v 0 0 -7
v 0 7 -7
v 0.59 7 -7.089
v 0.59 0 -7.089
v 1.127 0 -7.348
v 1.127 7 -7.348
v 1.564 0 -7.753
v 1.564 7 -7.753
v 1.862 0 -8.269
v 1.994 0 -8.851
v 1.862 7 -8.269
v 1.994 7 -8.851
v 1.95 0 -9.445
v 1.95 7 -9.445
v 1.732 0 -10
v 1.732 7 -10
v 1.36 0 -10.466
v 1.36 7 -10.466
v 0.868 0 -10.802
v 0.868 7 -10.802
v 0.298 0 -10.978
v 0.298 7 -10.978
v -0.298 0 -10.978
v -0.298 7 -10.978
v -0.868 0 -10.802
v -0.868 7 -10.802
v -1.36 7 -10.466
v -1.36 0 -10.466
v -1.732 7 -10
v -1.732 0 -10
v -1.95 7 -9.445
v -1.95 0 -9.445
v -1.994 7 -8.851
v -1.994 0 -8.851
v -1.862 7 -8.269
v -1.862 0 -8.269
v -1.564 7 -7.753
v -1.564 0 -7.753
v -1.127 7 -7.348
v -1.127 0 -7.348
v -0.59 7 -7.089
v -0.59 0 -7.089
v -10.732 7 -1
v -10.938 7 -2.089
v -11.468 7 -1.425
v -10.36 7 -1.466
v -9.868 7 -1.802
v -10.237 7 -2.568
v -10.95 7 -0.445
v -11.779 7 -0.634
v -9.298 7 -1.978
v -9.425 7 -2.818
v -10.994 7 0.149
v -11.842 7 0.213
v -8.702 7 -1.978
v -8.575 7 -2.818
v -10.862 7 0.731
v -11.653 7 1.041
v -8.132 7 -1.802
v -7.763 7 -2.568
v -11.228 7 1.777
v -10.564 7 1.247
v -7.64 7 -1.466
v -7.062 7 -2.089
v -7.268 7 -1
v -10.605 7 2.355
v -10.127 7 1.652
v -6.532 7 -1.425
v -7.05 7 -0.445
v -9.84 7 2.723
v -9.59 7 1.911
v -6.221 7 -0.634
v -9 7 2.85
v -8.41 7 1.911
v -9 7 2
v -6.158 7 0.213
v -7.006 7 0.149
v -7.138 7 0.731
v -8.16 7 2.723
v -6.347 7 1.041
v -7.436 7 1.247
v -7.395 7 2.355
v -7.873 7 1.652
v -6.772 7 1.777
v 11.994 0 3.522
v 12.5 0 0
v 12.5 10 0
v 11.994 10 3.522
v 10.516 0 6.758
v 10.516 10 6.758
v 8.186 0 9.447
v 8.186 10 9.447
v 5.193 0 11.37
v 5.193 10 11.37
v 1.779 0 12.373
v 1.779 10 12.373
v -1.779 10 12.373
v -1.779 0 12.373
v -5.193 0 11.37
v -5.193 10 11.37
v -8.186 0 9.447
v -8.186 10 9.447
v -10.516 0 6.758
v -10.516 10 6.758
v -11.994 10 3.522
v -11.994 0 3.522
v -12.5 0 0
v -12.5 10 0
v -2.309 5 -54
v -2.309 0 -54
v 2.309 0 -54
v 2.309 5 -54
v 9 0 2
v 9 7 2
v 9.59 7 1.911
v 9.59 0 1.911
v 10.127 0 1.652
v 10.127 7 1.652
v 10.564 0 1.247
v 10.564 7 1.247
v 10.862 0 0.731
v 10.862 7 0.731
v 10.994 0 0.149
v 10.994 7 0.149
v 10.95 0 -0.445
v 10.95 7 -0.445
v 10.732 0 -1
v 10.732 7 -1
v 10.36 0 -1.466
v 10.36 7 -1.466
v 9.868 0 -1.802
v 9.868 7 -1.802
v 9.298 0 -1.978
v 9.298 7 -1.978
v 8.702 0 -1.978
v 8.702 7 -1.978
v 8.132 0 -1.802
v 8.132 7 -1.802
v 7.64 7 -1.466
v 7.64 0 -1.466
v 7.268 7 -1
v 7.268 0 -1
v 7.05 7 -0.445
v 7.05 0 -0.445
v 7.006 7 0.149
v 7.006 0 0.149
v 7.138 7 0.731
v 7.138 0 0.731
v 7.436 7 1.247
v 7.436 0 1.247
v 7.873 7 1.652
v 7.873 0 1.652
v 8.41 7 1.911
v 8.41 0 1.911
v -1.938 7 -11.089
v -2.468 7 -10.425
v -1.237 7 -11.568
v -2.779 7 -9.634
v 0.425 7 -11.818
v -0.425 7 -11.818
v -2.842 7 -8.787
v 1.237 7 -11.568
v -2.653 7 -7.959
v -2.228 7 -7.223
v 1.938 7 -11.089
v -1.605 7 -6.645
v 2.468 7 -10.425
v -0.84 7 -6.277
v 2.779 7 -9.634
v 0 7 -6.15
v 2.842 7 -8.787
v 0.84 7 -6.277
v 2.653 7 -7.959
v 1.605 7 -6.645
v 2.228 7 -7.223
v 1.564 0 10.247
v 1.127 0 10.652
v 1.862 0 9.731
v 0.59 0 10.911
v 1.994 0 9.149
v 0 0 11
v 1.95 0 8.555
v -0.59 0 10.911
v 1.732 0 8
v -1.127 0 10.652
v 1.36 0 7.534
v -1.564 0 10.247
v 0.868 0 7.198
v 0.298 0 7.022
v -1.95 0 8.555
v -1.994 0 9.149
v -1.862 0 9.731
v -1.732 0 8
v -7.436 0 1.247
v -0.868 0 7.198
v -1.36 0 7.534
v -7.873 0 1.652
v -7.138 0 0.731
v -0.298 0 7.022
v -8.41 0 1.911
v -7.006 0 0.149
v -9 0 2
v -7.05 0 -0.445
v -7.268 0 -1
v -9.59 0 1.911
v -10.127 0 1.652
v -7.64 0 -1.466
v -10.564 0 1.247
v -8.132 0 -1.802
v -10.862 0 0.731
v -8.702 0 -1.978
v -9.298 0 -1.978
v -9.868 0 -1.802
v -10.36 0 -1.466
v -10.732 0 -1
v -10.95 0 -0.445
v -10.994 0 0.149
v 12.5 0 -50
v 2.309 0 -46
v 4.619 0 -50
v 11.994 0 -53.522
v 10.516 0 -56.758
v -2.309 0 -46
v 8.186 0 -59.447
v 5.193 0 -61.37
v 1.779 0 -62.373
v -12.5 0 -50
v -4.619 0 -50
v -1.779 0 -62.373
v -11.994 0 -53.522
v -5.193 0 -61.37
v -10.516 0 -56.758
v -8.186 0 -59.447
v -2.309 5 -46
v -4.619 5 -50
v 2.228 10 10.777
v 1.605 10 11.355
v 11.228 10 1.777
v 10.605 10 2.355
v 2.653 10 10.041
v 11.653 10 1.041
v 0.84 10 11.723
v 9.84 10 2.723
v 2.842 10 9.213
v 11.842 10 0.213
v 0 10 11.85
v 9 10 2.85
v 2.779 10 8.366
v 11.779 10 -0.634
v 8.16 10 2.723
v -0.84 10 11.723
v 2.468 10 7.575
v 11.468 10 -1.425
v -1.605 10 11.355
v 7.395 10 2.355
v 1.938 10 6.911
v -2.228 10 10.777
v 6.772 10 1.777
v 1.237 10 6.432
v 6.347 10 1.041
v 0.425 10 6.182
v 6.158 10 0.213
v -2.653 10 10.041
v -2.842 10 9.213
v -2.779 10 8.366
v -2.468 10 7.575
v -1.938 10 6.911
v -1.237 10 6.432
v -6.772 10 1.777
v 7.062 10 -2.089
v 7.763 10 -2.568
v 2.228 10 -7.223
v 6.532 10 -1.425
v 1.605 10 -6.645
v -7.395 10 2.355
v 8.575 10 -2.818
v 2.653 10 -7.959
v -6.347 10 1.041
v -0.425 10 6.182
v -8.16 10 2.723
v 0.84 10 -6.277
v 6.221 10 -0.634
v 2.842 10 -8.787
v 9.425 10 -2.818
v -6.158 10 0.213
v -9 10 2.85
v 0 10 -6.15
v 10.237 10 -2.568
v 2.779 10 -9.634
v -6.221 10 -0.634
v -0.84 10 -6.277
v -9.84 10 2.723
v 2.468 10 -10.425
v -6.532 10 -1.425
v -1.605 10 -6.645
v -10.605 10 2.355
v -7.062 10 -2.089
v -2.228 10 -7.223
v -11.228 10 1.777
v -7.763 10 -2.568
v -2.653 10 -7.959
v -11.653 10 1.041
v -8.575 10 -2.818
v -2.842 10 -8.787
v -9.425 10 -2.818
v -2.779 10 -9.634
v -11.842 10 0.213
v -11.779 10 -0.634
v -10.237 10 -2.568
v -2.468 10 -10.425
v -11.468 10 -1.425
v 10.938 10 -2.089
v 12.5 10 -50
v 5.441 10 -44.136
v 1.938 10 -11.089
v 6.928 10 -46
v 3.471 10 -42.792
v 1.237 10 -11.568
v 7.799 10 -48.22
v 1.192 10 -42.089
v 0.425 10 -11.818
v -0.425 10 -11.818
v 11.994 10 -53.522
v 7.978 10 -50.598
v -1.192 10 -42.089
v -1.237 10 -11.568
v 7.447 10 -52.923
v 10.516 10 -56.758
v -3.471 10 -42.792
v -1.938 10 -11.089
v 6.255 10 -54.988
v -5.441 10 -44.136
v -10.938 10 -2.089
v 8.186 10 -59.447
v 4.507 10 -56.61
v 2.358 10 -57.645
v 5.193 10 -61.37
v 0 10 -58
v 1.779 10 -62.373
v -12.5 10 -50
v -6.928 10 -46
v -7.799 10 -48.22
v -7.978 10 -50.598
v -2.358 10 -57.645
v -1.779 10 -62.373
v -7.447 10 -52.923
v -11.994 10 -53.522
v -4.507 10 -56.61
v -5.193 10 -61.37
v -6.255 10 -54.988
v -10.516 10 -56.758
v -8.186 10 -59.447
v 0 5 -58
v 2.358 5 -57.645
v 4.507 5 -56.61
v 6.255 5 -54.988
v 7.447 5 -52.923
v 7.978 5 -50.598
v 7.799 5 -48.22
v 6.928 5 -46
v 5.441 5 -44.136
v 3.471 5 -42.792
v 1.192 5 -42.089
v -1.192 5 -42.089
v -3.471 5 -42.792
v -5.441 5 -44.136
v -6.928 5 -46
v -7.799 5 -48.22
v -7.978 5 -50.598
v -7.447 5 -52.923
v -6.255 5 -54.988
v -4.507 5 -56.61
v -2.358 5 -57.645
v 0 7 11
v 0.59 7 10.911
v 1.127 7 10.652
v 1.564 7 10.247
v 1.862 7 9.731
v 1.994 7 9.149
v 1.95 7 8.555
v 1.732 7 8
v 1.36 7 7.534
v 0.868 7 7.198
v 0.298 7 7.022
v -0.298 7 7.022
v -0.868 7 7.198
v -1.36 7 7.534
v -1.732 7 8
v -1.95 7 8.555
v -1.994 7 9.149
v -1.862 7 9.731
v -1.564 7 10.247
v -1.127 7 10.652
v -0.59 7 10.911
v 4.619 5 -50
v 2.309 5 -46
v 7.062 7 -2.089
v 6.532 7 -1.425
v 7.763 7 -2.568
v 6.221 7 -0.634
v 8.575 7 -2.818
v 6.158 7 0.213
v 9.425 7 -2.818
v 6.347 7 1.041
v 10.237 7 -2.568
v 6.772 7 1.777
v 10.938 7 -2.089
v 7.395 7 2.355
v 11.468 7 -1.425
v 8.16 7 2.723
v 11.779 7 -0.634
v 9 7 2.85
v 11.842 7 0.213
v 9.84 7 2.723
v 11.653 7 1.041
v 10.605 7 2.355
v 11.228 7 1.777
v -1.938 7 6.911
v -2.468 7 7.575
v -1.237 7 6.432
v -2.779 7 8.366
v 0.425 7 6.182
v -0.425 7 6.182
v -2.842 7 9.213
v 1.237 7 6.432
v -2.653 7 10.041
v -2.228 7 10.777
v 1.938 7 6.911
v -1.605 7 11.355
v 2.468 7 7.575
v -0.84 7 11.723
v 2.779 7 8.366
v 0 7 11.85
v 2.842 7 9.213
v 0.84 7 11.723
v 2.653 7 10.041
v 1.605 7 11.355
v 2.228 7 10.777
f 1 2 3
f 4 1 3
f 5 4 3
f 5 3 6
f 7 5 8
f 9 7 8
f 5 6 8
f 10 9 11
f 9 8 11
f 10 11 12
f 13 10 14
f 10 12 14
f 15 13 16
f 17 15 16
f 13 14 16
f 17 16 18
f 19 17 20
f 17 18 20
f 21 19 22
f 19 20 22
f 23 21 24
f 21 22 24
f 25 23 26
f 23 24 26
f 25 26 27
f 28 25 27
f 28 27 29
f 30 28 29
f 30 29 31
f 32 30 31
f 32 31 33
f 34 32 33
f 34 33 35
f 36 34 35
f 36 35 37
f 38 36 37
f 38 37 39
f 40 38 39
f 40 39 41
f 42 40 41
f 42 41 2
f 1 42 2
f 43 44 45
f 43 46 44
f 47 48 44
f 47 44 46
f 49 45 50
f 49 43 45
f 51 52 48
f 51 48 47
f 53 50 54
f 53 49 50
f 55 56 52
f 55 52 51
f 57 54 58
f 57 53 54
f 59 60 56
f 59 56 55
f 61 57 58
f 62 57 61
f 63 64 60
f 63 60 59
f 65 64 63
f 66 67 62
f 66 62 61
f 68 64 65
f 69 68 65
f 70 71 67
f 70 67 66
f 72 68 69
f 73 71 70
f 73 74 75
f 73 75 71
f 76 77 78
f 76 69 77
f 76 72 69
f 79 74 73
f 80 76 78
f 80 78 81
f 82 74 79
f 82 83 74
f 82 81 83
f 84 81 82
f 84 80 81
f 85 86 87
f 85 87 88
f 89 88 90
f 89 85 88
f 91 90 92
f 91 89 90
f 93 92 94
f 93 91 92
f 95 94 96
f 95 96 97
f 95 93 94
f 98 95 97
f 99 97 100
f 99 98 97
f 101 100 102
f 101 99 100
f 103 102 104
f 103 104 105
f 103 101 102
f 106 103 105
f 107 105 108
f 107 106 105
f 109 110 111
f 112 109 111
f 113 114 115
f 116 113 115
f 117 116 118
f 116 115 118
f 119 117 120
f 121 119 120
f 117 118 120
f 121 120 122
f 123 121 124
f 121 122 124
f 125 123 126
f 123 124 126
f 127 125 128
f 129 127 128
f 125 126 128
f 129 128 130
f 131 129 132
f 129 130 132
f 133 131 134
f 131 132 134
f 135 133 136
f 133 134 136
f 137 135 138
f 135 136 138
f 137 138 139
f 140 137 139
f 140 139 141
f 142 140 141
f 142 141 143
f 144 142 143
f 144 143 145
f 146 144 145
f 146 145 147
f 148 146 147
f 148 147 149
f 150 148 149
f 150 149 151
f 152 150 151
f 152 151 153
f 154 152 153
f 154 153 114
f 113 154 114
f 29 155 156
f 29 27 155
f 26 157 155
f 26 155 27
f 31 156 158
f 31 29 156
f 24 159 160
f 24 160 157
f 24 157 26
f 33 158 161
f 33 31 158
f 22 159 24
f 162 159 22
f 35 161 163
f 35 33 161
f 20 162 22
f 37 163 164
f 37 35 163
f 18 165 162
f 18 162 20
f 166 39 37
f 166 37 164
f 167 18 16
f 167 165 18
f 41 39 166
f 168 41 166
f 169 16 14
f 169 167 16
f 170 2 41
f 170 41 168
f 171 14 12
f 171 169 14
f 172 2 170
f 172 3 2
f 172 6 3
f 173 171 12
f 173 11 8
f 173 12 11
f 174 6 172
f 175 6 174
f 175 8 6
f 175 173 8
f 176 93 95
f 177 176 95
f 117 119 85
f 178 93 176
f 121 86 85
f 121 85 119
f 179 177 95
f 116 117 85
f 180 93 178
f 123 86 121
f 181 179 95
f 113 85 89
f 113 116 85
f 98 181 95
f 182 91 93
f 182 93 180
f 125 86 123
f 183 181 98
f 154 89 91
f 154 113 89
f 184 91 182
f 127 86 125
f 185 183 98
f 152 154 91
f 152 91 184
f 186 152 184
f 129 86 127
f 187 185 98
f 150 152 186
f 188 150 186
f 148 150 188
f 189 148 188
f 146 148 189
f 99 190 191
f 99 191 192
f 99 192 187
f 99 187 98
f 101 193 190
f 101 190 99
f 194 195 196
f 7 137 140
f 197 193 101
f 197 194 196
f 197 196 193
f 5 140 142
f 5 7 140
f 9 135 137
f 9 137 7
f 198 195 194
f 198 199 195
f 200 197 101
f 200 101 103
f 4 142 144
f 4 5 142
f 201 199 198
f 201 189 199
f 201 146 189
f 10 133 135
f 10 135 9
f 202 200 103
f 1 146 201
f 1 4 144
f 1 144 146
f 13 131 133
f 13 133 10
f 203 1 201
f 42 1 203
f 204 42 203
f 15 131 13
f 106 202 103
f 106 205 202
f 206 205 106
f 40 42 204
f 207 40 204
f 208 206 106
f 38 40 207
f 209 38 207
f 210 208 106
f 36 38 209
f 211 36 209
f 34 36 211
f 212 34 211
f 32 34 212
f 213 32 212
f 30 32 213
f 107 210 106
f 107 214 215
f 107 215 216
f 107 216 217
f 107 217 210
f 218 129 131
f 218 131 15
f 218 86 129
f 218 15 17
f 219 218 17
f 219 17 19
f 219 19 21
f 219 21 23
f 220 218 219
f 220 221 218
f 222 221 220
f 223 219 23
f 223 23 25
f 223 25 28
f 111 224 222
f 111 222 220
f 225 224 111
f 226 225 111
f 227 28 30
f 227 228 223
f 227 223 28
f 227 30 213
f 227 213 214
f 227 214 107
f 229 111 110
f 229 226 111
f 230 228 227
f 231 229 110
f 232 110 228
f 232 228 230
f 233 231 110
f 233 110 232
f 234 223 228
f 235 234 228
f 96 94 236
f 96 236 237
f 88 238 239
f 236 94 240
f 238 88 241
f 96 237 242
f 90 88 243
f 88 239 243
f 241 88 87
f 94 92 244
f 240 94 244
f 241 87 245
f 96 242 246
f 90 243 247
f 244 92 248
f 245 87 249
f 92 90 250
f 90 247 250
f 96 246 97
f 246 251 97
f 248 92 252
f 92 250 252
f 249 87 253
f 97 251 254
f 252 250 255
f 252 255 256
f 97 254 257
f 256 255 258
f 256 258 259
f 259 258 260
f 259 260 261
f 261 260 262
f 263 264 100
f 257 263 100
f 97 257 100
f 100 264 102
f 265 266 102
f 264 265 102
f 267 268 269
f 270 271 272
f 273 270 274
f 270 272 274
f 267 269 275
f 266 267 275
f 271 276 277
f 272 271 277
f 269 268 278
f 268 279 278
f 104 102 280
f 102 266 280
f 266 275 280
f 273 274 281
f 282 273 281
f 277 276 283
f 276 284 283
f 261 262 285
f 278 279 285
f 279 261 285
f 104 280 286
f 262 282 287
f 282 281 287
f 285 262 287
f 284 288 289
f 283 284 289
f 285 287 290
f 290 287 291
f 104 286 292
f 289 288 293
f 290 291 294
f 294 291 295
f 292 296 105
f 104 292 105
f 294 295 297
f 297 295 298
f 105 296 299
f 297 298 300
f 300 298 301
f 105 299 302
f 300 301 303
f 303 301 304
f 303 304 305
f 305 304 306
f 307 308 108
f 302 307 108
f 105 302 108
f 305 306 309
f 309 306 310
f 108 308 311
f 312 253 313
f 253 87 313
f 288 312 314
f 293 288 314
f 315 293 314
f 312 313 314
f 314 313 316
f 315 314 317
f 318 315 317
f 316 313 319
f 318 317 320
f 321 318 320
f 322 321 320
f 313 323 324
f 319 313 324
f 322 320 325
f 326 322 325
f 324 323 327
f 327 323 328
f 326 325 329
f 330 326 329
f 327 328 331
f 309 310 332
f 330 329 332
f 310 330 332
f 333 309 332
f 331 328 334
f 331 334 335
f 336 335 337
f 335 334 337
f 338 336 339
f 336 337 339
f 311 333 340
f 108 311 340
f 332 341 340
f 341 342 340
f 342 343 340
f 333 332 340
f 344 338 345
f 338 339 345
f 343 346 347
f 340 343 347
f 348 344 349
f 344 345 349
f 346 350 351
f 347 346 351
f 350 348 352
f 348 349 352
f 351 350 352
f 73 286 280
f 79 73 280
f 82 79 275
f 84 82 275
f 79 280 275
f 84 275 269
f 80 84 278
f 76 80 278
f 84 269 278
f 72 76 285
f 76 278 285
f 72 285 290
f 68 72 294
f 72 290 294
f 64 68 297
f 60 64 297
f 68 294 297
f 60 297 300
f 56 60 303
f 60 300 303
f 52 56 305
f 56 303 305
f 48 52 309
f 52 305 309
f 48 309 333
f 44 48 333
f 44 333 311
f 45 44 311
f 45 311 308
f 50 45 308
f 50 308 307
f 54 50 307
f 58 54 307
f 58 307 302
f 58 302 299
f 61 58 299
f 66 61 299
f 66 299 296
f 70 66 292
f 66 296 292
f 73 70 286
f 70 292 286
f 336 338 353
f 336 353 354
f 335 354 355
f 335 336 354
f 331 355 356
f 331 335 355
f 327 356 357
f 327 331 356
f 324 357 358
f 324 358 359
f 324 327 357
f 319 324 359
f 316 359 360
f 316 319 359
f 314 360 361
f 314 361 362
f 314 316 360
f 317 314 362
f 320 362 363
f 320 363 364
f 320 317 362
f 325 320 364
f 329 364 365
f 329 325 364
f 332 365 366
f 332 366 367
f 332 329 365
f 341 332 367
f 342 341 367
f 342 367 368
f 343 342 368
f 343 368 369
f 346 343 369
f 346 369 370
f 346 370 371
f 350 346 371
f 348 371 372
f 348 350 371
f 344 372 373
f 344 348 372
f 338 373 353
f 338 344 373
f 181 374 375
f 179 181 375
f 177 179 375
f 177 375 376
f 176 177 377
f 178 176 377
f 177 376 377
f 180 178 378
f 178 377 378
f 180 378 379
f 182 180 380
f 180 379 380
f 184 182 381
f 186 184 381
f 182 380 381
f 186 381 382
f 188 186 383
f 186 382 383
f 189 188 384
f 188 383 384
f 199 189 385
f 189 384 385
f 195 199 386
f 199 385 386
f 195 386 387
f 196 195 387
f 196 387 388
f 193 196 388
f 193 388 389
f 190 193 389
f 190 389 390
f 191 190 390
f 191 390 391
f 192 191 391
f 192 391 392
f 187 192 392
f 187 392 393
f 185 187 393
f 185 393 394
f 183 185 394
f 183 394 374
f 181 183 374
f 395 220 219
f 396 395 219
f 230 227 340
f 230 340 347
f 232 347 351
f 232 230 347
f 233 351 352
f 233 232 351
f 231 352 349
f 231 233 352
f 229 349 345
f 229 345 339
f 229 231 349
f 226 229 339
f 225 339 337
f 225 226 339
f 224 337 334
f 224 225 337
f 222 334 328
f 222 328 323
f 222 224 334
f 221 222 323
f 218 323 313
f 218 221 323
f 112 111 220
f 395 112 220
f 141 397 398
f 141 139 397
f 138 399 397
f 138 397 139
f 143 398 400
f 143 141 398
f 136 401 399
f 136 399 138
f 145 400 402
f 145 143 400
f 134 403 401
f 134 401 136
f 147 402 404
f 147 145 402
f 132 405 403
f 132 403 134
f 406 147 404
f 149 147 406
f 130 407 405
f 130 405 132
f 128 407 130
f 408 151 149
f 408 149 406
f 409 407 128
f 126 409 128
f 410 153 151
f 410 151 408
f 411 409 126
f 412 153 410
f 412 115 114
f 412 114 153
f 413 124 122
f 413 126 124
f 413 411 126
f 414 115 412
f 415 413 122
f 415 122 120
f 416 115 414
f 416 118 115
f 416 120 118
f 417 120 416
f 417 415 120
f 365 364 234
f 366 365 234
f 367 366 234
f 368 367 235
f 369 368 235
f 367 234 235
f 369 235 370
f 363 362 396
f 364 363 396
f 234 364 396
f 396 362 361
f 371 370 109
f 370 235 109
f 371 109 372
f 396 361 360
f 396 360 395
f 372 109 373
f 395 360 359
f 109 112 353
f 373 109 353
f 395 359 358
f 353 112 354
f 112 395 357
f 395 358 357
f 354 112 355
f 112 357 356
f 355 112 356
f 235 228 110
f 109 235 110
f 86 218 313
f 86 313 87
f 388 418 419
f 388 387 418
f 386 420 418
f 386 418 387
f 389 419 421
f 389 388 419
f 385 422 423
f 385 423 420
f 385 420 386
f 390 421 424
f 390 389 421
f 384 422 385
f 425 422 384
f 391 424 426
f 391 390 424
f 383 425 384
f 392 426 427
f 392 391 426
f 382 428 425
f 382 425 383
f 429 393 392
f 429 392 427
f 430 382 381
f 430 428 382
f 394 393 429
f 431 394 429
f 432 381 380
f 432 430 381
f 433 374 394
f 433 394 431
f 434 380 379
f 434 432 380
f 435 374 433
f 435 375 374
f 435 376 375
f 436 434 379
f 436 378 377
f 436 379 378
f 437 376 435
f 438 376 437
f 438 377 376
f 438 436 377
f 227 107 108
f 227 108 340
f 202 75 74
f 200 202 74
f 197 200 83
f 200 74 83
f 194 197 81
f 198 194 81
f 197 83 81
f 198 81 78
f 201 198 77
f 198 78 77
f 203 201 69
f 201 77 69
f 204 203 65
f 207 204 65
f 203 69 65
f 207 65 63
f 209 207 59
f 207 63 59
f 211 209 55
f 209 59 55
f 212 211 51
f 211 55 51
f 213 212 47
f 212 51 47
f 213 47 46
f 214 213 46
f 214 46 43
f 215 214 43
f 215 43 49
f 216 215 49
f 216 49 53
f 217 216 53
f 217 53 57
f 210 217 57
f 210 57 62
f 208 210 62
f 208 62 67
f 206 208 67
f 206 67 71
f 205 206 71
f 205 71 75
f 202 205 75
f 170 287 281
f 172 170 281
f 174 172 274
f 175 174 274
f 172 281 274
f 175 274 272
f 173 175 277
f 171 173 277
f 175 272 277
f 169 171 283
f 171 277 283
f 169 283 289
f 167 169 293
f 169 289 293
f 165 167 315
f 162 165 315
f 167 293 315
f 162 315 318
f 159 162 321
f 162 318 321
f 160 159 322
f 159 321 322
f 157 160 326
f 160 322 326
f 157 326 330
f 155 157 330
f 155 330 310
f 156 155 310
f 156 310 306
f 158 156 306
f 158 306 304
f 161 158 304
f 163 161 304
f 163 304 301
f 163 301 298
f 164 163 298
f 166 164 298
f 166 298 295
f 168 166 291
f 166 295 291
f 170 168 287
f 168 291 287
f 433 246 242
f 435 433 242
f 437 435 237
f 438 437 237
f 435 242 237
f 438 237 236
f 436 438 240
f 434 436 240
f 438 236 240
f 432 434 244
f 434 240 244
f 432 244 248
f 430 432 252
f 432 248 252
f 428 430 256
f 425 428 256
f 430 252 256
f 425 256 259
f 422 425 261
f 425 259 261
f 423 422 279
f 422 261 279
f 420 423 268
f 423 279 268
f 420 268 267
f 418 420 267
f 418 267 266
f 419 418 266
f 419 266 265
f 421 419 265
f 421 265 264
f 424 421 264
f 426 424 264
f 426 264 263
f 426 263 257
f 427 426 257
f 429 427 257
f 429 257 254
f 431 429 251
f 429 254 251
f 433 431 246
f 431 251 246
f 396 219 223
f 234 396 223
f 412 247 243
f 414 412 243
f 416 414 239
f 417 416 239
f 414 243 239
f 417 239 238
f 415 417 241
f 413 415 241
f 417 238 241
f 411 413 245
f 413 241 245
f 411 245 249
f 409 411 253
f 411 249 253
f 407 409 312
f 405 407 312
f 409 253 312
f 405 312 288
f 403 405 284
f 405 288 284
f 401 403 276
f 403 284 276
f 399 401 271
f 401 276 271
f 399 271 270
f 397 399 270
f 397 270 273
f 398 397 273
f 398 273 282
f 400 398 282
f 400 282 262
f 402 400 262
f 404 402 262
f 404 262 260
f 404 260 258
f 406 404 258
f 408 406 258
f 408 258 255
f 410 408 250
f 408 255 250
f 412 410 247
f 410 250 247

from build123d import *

# Parameters (mm, degrees)
BOSS_EXTRUDE1_DEPTH = 10
SKETCH2_R           = 2.85
CUT_EXTRUDE1_DEPTH  = 3
SKETCH3_R           = 2
CUT_EXTRUDE2_DEPTH  = 65.517439503
SKETCH4_R           = 8
CUT_EXTRUDE5_DEPTH  = 5
SKETCH6_R           = 3.5
CUT_EXTRUDE6_DEPTH  = 65.517439503
CUT_EXTRUDE7_DEPTH  = 65.517439503


with BuildPart() as part:
    # Sketch1 → Boss-Extrude1 (new body)
    with BuildSketch(Plane(origin=(0, 0, 0), x_dir=(1, 0, 0), z_dir=(0, 1, 0))):
        with BuildLine():
            Line((-12.5, 0), (-12.5, 50))
            ThreePointArc((-12.5, 50), (0, 62.5), (12.5, 50))
            Line((12.5, 50), (12.5, 0))
            ThreePointArc((12.5, 0), (0, -12.5), (-12.5, 0))
        make_face()
    extrude(amount=BOSS_EXTRUDE1_DEPTH)

    # Sketch2 → Cut-Extrude1 (cut)
    with BuildSketch(Plane(origin=(0, 10, 0), x_dir=(1, 0, 0), z_dir=(0, 1, 0))):
        with Locations(Location((0, 9, 0), (0, 0, 270))):
            Circle(SKETCH2_R)
        with Locations(Location((9, 0, 0), (0, 0, 270))):
            Circle(SKETCH2_R)
        with Locations(Location((0, -9, 0), (0, 0, 270))):
            Circle(SKETCH2_R)
        with Locations(Location((-9, 0, 0), (0, 0, 270))):
            Circle(SKETCH2_R)
    extrude(amount=-CUT_EXTRUDE1_DEPTH, mode=Mode.SUBTRACT)

    # Sketch3 → Cut-Extrude2 (cut, through all)
    with BuildSketch(Plane(origin=(0, 10, 0), x_dir=(1, 0, 0), z_dir=(0, 1, 0))):
        with Locations(Location((0, 9, 0), (0, 0, 270))):
            Circle(SKETCH3_R)
        with Locations(Location((9, 0, 0), (0, 0, 270))):
            Circle(SKETCH3_R)
        with Locations(Location((0, -9, 0), (0, 0, 270))):
            Circle(SKETCH3_R)
        with Locations(Location((-9, 0, 0), (0, 0, 270))):
            Circle(SKETCH3_R)
    extrude(amount=-CUT_EXTRUDE2_DEPTH, mode=Mode.SUBTRACT)

    # Sketch4 → Cut-Extrude5 (cut)
    with BuildSketch(Plane.XZ.offset(-10)):
        with Locations(Location((0, -50, 0), (0, 0, 270))):
            Circle(SKETCH4_R)
    extrude(amount=CUT_EXTRUDE5_DEPTH, mode=Mode.SUBTRACT)

    # Sketch6 → Cut-Extrude6 (cut, through all)
    with BuildSketch(Plane(origin=(0, 10, 0), x_dir=(1, 0, 0), z_dir=(0, 1, 0))):
        with Locations(Location((0, 50, 0), (0, 0, 270))):
            Circle(SKETCH6_R)
    extrude(amount=-CUT_EXTRUDE6_DEPTH, mode=Mode.SUBTRACT)

    # Sketch7 → Cut-Extrude7 (cut, through all)
    with BuildSketch(Plane.XZ):
        Polygon((4.618802154, -50), (2.309401077, -46), (-2.309401077, -46), (-4.618802154, -50), (-2.309401077, -54), (2.309401077, -54), align=None)
    extrude(amount=-CUT_EXTRUDE7_DEPTH, mode=Mode.SUBTRACT)


solid = part.part
